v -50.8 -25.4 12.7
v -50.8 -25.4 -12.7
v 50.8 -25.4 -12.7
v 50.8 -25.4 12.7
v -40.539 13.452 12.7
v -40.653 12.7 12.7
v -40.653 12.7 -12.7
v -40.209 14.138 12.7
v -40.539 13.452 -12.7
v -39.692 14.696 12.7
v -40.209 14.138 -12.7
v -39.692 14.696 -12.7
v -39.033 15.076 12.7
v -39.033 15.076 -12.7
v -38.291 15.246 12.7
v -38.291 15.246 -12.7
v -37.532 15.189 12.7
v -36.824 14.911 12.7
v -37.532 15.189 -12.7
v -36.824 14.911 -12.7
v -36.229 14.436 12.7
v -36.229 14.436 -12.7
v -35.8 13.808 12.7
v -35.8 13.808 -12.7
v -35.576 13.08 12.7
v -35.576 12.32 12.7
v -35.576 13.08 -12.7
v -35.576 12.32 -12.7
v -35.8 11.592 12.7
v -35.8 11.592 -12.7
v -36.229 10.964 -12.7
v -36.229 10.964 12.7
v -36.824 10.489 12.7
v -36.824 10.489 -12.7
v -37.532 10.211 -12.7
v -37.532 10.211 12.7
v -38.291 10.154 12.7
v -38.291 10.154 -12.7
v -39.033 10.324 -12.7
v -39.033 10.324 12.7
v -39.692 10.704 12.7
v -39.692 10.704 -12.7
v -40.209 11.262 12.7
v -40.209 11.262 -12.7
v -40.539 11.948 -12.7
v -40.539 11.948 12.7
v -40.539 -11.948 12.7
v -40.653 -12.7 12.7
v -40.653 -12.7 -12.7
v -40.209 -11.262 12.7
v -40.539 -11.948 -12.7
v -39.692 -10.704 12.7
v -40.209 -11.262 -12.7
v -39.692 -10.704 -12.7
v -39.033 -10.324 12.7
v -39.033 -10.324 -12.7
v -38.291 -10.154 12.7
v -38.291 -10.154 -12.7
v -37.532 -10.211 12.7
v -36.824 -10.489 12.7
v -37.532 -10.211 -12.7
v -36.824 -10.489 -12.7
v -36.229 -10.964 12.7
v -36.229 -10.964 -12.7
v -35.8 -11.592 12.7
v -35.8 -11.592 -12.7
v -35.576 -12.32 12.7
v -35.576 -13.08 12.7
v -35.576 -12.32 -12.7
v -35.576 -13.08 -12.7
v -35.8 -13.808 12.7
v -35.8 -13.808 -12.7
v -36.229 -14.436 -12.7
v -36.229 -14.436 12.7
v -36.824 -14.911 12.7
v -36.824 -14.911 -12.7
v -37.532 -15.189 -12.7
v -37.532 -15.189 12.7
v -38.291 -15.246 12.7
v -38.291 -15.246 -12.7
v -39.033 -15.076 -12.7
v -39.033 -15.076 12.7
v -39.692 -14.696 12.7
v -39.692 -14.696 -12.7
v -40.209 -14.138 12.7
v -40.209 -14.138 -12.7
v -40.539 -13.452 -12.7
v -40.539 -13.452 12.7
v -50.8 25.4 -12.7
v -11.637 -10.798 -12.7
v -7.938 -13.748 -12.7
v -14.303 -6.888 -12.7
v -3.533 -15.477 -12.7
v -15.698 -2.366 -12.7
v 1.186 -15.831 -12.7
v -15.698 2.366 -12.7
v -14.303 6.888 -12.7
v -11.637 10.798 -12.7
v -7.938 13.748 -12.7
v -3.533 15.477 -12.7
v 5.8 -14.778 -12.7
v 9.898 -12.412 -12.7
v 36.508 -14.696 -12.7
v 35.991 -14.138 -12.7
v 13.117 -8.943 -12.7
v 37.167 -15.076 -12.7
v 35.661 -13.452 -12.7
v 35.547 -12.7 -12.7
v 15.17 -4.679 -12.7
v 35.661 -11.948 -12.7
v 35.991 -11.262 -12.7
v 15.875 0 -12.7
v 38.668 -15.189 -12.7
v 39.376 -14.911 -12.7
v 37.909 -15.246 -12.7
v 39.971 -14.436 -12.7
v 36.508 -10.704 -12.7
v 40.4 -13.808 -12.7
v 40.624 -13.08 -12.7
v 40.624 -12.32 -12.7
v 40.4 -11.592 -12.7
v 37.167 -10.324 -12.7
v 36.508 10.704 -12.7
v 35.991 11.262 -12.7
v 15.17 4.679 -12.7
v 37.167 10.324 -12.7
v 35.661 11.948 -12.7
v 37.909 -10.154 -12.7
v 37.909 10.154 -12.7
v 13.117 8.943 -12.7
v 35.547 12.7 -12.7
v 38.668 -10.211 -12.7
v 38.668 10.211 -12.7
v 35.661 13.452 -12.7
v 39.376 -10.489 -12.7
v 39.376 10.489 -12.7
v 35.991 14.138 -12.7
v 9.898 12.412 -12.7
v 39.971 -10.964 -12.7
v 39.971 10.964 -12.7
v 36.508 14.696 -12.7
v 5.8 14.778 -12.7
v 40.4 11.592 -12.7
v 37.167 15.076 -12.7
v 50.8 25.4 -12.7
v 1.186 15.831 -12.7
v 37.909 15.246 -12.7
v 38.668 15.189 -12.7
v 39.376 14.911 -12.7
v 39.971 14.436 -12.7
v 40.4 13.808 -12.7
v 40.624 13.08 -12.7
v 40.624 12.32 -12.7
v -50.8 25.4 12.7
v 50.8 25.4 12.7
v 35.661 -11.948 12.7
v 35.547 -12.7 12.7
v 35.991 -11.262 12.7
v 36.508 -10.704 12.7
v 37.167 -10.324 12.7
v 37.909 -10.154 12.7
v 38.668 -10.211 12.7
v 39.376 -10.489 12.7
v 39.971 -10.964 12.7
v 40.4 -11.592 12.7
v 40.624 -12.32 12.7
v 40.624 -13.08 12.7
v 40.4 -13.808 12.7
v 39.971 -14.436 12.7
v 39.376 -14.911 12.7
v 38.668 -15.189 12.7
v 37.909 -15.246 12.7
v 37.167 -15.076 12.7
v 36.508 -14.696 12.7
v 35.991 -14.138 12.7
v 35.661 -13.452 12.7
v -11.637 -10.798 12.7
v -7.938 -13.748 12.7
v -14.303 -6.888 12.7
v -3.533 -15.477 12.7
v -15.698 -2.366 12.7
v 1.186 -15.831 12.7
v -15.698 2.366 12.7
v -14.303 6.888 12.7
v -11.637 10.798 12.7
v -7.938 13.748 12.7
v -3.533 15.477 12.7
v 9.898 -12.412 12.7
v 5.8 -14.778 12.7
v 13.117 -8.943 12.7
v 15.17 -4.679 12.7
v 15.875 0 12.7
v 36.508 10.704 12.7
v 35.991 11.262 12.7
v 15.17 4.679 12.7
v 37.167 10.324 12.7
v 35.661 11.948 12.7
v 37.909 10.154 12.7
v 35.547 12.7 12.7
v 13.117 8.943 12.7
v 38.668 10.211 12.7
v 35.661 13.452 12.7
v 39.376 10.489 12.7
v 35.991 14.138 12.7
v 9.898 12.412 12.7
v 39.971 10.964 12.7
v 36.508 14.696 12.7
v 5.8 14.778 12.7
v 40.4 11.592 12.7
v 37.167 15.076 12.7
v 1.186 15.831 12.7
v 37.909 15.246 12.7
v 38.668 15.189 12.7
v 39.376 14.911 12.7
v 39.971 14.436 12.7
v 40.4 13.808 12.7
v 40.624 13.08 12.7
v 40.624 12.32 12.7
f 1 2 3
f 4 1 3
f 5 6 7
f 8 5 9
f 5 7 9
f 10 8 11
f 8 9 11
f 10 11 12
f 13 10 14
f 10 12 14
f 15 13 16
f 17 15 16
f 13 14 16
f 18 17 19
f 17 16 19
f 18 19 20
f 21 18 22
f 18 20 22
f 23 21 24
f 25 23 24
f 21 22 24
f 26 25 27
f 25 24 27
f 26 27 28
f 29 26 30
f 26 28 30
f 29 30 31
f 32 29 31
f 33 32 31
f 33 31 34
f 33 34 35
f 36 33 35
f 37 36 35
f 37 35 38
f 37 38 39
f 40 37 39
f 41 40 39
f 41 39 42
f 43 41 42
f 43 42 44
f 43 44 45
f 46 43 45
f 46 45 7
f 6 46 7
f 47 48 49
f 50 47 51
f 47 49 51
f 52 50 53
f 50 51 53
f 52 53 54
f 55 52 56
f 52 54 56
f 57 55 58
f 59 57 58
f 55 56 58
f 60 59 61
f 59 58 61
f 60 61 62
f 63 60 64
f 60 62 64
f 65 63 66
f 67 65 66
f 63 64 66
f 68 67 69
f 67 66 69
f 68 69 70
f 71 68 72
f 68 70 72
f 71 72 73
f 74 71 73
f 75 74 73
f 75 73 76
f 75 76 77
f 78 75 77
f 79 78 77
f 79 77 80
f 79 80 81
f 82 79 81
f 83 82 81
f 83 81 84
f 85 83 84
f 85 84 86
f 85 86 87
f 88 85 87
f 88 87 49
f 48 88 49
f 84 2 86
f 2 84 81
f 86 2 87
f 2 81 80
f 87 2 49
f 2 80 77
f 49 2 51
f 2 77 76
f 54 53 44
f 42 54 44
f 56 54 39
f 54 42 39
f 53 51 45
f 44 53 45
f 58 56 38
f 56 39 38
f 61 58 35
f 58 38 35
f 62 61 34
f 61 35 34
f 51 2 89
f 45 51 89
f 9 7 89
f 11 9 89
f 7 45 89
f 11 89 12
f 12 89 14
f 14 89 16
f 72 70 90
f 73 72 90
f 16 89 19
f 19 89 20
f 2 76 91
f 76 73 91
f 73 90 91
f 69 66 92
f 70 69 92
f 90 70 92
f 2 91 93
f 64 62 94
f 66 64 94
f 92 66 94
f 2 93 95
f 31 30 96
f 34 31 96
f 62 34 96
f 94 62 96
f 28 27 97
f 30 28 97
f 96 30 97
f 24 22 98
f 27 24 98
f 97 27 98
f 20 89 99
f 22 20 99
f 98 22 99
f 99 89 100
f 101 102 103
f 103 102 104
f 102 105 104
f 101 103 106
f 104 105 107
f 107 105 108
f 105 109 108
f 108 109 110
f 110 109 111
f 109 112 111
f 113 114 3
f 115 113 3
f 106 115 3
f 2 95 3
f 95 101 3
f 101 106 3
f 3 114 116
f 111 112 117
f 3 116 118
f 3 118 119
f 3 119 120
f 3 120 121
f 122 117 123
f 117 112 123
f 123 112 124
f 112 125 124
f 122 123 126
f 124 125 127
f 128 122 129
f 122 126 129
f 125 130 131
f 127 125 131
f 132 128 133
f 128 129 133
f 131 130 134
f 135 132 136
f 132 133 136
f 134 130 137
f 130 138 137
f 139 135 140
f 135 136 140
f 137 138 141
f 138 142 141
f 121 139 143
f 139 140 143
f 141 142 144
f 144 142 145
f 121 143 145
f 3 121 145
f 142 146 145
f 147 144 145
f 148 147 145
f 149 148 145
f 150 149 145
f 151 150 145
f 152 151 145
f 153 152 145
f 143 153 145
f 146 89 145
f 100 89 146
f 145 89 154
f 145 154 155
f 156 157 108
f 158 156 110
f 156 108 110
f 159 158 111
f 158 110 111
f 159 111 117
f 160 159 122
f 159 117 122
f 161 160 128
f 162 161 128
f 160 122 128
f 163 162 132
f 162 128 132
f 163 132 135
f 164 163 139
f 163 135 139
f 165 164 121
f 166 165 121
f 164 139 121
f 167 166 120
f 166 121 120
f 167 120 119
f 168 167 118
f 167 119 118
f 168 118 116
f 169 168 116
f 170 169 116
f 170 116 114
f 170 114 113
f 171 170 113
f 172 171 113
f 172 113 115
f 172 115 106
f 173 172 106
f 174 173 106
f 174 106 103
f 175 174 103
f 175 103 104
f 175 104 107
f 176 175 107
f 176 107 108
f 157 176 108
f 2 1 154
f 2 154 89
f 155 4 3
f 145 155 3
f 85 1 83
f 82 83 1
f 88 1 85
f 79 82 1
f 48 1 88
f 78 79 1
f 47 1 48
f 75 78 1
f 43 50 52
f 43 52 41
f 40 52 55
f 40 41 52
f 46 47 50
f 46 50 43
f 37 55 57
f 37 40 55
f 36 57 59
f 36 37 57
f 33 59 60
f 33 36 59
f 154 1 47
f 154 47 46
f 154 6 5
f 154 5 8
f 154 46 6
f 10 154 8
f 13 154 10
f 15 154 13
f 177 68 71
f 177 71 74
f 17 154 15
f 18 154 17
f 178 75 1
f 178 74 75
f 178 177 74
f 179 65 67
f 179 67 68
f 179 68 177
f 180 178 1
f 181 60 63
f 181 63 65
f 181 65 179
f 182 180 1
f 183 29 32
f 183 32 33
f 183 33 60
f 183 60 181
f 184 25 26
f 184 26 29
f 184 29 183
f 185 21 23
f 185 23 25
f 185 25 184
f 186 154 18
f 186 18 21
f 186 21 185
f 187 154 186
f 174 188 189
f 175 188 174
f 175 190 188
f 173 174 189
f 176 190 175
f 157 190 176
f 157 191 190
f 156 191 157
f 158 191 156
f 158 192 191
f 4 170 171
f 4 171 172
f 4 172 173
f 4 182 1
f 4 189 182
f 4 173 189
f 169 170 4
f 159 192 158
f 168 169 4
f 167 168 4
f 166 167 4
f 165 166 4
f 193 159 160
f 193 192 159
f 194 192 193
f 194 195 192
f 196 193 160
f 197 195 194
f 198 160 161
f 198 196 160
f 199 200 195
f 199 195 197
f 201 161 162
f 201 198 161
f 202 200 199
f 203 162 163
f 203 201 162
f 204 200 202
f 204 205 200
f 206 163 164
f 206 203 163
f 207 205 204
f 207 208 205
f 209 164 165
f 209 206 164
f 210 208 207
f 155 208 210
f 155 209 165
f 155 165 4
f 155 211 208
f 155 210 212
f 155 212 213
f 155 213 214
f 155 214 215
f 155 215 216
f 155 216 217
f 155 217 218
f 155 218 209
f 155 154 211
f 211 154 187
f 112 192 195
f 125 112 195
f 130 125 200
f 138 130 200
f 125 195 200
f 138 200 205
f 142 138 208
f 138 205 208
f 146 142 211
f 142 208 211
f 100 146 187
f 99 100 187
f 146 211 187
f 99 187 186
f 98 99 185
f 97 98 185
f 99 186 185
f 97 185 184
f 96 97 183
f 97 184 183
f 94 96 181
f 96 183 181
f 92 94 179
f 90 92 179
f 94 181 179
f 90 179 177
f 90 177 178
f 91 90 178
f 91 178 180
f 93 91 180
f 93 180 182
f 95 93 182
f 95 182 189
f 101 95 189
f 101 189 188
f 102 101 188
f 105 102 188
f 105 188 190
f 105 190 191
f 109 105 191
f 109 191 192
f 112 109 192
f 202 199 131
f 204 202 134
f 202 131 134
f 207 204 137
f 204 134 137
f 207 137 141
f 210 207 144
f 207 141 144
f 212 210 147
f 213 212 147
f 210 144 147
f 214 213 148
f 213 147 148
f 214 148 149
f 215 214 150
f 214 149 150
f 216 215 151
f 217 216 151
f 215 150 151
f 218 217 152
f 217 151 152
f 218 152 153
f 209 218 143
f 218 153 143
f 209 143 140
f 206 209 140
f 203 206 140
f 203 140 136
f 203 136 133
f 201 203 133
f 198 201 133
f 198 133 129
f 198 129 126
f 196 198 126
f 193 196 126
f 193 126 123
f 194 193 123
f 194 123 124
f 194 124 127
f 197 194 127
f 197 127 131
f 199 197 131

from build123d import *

# Parameters (mm, degrees)
SKETCH1_W               = 101.6
SKETCH1_H               = 25.4
BOSS_EXTRUDE1_DEPTH     = 25.4
CUT_EXTRUDE1_REACH      = 64.217
SKETCH2_R               = 15.875
F_1_4_20_TAPPED_HOLE1_D = 5.1054


with BuildPart() as part:
    # Sketch1 → Boss-Extrude1 (new, symmetric)
    with BuildSketch(Plane(origin=(0, 0, 0), x_dir=(1, 0, 0), z_dir=(0, 1, 0))):
        Rectangle(SKETCH1_W, SKETCH1_H)
    extrude(amount=BOSS_EXTRUDE1_DEPTH, both=True)

    # Sketch2 → Cut-Extrude1 (cut, up to next)
    with BuildSketch(Plane.XY.offset(12.7), mode=Mode.PRIVATE) as cut_extrude1_sk1:
        Circle(SKETCH2_R)
    cut_extrude1_tool1 = extrude(cut_extrude1_sk1.sketch, amount=-CUT_EXTRUDE1_REACH, mode=Mode.PRIVATE) & part.part
    add(cut_extrude1_tool1.solids().sort_by_distance((0, 0, 12.7))[0], mode=Mode.SUBTRACT)

    # 1/4-20 Tapped Hole1 (through all)
    with Locations(Plane.XY.offset(12.7)):
        with Locations((-38.1, 12.7), (-38.1, -12.7), (38.1, 12.7), (38.1, -12.7)):
            Hole(F_1_4_20_TAPPED_HOLE1_D / 2)


solid = part.part
